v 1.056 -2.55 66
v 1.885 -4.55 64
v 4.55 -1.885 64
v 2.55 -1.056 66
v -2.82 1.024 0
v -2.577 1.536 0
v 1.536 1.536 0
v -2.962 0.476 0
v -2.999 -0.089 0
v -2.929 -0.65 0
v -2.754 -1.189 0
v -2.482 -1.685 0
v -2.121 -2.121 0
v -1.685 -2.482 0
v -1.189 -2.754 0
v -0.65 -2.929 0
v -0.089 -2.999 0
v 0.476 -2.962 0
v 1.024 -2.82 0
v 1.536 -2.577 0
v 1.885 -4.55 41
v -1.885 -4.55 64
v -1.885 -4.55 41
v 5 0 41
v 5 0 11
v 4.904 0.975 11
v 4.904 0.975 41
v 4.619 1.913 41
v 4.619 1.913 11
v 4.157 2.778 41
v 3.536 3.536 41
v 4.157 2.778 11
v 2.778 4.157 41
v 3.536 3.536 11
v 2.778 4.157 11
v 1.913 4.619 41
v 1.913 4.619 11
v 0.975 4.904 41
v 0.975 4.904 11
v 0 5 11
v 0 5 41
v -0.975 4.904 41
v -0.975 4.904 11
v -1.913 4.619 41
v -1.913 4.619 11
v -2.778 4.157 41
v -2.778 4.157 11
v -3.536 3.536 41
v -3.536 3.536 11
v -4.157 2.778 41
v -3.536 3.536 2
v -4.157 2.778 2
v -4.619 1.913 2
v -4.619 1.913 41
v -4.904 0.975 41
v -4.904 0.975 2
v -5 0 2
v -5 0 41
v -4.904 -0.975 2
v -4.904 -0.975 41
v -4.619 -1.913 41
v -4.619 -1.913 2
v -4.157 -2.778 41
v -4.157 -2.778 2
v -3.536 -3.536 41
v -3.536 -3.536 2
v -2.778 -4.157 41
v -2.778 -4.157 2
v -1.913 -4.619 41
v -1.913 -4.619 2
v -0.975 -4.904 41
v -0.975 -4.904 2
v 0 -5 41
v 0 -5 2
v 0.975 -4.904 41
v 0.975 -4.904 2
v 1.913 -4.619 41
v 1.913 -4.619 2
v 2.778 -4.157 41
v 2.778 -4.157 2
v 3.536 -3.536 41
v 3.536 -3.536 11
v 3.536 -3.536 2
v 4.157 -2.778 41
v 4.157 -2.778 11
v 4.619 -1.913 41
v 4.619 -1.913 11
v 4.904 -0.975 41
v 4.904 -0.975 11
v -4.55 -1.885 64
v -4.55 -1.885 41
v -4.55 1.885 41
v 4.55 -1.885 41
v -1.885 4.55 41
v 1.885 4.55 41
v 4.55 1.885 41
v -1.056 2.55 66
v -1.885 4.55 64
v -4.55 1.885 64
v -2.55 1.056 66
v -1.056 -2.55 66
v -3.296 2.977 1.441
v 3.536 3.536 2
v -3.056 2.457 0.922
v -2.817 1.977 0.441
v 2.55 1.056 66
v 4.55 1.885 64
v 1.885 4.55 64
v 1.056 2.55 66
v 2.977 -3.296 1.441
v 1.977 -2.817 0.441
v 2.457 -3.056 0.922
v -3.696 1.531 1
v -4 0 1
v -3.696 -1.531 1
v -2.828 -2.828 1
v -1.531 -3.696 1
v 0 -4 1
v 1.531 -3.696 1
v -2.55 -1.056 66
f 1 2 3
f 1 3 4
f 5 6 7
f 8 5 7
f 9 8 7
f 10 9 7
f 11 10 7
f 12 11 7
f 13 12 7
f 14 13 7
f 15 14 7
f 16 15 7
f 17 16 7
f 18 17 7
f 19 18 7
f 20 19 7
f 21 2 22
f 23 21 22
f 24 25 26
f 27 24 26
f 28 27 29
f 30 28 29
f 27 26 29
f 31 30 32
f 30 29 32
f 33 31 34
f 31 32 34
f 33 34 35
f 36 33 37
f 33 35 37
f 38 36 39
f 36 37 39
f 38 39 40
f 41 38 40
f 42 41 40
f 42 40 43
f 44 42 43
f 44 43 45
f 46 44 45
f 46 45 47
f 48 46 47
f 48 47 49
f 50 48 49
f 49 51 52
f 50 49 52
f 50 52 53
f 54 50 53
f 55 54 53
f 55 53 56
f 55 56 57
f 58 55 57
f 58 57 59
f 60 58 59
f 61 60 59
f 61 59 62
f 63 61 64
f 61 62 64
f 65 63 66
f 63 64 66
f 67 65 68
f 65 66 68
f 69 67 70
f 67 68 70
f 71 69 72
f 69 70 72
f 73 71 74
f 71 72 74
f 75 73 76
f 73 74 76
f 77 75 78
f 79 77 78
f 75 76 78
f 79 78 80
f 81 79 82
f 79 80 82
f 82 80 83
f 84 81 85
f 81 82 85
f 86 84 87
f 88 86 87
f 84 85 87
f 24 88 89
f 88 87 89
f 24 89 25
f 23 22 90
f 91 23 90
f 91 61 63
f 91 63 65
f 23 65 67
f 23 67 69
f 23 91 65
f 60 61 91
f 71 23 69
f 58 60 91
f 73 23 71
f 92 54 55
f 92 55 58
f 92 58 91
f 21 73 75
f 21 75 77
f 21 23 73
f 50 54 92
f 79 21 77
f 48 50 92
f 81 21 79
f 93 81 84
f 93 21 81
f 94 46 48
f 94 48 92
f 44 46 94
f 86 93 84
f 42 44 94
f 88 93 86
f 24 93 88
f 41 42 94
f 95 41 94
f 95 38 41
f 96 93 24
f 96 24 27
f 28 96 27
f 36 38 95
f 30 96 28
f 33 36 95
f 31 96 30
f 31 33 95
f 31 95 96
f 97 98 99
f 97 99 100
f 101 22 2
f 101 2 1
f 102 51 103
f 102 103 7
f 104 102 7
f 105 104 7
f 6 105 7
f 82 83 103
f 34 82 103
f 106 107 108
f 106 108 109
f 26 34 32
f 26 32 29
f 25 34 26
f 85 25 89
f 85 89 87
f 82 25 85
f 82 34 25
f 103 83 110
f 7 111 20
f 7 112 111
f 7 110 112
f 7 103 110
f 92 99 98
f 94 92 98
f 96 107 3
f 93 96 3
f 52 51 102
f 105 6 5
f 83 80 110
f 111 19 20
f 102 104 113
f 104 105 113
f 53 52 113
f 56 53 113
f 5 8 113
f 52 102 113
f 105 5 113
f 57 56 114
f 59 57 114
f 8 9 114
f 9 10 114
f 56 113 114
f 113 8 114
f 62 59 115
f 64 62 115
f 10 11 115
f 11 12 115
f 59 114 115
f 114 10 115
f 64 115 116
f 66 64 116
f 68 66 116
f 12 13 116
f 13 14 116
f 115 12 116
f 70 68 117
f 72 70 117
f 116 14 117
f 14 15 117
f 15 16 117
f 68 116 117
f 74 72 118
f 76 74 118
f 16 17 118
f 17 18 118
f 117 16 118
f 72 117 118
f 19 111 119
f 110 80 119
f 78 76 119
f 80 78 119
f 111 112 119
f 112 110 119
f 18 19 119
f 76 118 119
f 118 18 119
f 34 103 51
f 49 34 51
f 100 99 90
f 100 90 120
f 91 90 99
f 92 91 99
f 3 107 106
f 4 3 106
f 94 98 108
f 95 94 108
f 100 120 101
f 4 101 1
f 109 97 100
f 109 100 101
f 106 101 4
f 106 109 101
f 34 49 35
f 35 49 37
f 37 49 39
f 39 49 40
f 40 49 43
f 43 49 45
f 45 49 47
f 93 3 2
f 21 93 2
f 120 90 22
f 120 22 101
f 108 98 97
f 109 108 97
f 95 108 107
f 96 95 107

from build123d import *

# Parameters (mm, degrees)
F0_R         = 5
F1_DEPTH     = 66
F2_R         = 5
F3_DEPTH     = 25
F5_DEPTH     = 11
F6_T1_DEPTH  = 14.0560753695
F6_T3_DEPTH  = 14.0560753695
F6_T5_DEPTH  = 14.0560753695
F6_T7_DEPTH  = 14.0560753695
F6_T9_DEPTH  = 14.0560753695
F6_T11_DEPTH = 14.0560753695
F6_T13_DEPTH = 17.3577997637
F6_T15_DEPTH = 17.3577997637
F6_T18_ANGLE = 298.0668340959


# Not quite as in the source:
# - a fillet or chamfer that OpenCascade refuses, or shapes differently, is made with other operations: its cross-section is extruded or revolved along the edge and cut away or added


with BuildPart() as f1:
    # F0 (on Top) → F1 (new body)
    with BuildSketch(Plane.XY):
        Circle(F0_R)
    extrude(amount=F1_DEPTH)

    # F2 (on face) → F3 (cut)
    with BuildSketch(Plane.XY.offset(66)):
        Circle(F2_R)
        Polygon((4.55, 1.8846717088), (4.55, -1.8846717088), (1.8846717088, -4.55), (-1.8846717088, -4.55), (-4.55, -1.8846717088), (-4.55, 1.8846717088), (-1.8846717088, 4.55), (1.8846717088, 4.55), align=None, mode=Mode.SUBTRACT)
    extrude(amount=-F3_DEPTH, mode=Mode.SUBTRACT)

    # F4 (on face) → F5 (cut)
    with BuildSketch(Plane(origin=(0, 0, 0), x_dir=(1, 0, 0), z_dir=(0, 0, -1))):
        with BuildLine():
            ThreePointArc((5, 0), (4.6193976626, 1.9134171618), (3.5355339059, 3.5355339059))
            Line((3.5355339059, 3.5355339059), (3.5355339059, -3.5355339059))
            ThreePointArc((3.5355339059, -3.5355339059), (4.6193976626, -1.9134171618), (5, 0))
        make_face()
        with BuildLine():
            ThreePointArc((-3.5355339059, -3.5355339059), (0, -5), (3.5355339059, -3.5355339059))
            Line((3.5355339059, -3.5355339059), (-3.5355339059, -3.5355339059))
        make_face()
    extrude(amount=-F5_DEPTH, mode=Mode.SUBTRACT)

    # F6: chamfer of 2 on 11 edges, made by hand

    # F6_s2 → F6_t1 (cut)
    with BuildSketch(Plane(origin=(-4.9695731053, 4.9695731053, 0), x_dir=(0, 0, 1), z_dir=(0.7071067812, -0.7071067812, 0))):
        Polygon((64, -4.55), (66, -2.55), (66, -4.55), align=None)
    extrude(amount=F6_T1_DEPTH, mode=Mode.SUBTRACT)

    # F6_s4 → F6_t3 (cut)
    with BuildSketch(Plane.XZ.offset(-7.0280376847)):
        Polygon((4.55, 64), (2.55, 66), (4.55, 66), align=None)
        Polygon((-4.55, 64), (-2.55, 66), (-4.55, 66), align=None)
    extrude(amount=F6_T3_DEPTH, mode=Mode.SUBTRACT)

    # F6_s6 → F6_t5 (cut)
    with BuildSketch(Plane(origin=(4.9695731053, 4.9695731053, 0), x_dir=(0, 0, 1), z_dir=(-0.7071067812, -0.7071067812, 0))):
        Polygon((64, -4.55), (66, -2.55), (66, -4.55), align=None)
    extrude(amount=F6_T5_DEPTH, mode=Mode.SUBTRACT)

    # F6_s8 → F6_t7 (cut)
    with BuildSketch(Plane.YZ.offset(-7.0280376847)):
        Polygon((-4.55, 64), (-2.55, 66), (-4.55, 66), align=None)
        Polygon((4.55, 64), (2.55, 66), (4.55, 66), align=None)
    extrude(amount=F6_T7_DEPTH, mode=Mode.SUBTRACT)

    # F6_s10 → F6_t9 (cut)
    with BuildSketch(Plane(origin=(4.9695731053, -4.9695731053, 0), x_dir=(0, 0, 1), z_dir=(-0.7071067812, 0.7071067812, 0))):
        Polygon((64, -4.55), (66, -2.55), (66, -4.55), align=None)
    extrude(amount=F6_T9_DEPTH, mode=Mode.SUBTRACT)

    # F6_s12 → F6_t11 (cut)
    with BuildSketch(Plane(origin=(-4.9695731053, -4.9695731053, 0), x_dir=(0, 0, 1), z_dir=(0.7071067812, 0.7071067812, 0))):
        Polygon((64, -4.55), (66, -2.55), (66, -4.55), align=None)
    extrude(amount=F6_T11_DEPTH, mode=Mode.SUBTRACT)

    # F6_s14 → F6_t13 (cut)
    with BuildSketch(Plane.XZ.offset(-8.6788998819)):
        Polygon((3.5355339059, 2), (1.5355339059, 0), (3.5355339059, 0), align=None)
    extrude(amount=F6_T13_DEPTH, mode=Mode.SUBTRACT)

    # F6_s16 → F6_t15 (cut)
    with BuildSketch(Plane.YZ.offset(-8.6788998819)):
        Polygon((3.5355339059, 2), (1.5355339059, 0), (3.5355339059, 0), align=None)
    extrude(amount=F6_T15_DEPTH, mode=Mode.SUBTRACT)

    # F6_s17 → F6_t18 (revolve, cut)
    with BuildSketch(Plane(origin=(0, 0, 0), x_dir=(0, 0, 1), z_dir=(0.9701544633, -0.2424877673, 0))):
        Polygon((2, -5), (0, -3), (0, -5), align=None)
    revolve(axis=Axis((0, 0, 0), (0, 0, 1)), revolution_arc=F6_T18_ANGLE, mode=Mode.SUBTRACT)


solid = f1.part
